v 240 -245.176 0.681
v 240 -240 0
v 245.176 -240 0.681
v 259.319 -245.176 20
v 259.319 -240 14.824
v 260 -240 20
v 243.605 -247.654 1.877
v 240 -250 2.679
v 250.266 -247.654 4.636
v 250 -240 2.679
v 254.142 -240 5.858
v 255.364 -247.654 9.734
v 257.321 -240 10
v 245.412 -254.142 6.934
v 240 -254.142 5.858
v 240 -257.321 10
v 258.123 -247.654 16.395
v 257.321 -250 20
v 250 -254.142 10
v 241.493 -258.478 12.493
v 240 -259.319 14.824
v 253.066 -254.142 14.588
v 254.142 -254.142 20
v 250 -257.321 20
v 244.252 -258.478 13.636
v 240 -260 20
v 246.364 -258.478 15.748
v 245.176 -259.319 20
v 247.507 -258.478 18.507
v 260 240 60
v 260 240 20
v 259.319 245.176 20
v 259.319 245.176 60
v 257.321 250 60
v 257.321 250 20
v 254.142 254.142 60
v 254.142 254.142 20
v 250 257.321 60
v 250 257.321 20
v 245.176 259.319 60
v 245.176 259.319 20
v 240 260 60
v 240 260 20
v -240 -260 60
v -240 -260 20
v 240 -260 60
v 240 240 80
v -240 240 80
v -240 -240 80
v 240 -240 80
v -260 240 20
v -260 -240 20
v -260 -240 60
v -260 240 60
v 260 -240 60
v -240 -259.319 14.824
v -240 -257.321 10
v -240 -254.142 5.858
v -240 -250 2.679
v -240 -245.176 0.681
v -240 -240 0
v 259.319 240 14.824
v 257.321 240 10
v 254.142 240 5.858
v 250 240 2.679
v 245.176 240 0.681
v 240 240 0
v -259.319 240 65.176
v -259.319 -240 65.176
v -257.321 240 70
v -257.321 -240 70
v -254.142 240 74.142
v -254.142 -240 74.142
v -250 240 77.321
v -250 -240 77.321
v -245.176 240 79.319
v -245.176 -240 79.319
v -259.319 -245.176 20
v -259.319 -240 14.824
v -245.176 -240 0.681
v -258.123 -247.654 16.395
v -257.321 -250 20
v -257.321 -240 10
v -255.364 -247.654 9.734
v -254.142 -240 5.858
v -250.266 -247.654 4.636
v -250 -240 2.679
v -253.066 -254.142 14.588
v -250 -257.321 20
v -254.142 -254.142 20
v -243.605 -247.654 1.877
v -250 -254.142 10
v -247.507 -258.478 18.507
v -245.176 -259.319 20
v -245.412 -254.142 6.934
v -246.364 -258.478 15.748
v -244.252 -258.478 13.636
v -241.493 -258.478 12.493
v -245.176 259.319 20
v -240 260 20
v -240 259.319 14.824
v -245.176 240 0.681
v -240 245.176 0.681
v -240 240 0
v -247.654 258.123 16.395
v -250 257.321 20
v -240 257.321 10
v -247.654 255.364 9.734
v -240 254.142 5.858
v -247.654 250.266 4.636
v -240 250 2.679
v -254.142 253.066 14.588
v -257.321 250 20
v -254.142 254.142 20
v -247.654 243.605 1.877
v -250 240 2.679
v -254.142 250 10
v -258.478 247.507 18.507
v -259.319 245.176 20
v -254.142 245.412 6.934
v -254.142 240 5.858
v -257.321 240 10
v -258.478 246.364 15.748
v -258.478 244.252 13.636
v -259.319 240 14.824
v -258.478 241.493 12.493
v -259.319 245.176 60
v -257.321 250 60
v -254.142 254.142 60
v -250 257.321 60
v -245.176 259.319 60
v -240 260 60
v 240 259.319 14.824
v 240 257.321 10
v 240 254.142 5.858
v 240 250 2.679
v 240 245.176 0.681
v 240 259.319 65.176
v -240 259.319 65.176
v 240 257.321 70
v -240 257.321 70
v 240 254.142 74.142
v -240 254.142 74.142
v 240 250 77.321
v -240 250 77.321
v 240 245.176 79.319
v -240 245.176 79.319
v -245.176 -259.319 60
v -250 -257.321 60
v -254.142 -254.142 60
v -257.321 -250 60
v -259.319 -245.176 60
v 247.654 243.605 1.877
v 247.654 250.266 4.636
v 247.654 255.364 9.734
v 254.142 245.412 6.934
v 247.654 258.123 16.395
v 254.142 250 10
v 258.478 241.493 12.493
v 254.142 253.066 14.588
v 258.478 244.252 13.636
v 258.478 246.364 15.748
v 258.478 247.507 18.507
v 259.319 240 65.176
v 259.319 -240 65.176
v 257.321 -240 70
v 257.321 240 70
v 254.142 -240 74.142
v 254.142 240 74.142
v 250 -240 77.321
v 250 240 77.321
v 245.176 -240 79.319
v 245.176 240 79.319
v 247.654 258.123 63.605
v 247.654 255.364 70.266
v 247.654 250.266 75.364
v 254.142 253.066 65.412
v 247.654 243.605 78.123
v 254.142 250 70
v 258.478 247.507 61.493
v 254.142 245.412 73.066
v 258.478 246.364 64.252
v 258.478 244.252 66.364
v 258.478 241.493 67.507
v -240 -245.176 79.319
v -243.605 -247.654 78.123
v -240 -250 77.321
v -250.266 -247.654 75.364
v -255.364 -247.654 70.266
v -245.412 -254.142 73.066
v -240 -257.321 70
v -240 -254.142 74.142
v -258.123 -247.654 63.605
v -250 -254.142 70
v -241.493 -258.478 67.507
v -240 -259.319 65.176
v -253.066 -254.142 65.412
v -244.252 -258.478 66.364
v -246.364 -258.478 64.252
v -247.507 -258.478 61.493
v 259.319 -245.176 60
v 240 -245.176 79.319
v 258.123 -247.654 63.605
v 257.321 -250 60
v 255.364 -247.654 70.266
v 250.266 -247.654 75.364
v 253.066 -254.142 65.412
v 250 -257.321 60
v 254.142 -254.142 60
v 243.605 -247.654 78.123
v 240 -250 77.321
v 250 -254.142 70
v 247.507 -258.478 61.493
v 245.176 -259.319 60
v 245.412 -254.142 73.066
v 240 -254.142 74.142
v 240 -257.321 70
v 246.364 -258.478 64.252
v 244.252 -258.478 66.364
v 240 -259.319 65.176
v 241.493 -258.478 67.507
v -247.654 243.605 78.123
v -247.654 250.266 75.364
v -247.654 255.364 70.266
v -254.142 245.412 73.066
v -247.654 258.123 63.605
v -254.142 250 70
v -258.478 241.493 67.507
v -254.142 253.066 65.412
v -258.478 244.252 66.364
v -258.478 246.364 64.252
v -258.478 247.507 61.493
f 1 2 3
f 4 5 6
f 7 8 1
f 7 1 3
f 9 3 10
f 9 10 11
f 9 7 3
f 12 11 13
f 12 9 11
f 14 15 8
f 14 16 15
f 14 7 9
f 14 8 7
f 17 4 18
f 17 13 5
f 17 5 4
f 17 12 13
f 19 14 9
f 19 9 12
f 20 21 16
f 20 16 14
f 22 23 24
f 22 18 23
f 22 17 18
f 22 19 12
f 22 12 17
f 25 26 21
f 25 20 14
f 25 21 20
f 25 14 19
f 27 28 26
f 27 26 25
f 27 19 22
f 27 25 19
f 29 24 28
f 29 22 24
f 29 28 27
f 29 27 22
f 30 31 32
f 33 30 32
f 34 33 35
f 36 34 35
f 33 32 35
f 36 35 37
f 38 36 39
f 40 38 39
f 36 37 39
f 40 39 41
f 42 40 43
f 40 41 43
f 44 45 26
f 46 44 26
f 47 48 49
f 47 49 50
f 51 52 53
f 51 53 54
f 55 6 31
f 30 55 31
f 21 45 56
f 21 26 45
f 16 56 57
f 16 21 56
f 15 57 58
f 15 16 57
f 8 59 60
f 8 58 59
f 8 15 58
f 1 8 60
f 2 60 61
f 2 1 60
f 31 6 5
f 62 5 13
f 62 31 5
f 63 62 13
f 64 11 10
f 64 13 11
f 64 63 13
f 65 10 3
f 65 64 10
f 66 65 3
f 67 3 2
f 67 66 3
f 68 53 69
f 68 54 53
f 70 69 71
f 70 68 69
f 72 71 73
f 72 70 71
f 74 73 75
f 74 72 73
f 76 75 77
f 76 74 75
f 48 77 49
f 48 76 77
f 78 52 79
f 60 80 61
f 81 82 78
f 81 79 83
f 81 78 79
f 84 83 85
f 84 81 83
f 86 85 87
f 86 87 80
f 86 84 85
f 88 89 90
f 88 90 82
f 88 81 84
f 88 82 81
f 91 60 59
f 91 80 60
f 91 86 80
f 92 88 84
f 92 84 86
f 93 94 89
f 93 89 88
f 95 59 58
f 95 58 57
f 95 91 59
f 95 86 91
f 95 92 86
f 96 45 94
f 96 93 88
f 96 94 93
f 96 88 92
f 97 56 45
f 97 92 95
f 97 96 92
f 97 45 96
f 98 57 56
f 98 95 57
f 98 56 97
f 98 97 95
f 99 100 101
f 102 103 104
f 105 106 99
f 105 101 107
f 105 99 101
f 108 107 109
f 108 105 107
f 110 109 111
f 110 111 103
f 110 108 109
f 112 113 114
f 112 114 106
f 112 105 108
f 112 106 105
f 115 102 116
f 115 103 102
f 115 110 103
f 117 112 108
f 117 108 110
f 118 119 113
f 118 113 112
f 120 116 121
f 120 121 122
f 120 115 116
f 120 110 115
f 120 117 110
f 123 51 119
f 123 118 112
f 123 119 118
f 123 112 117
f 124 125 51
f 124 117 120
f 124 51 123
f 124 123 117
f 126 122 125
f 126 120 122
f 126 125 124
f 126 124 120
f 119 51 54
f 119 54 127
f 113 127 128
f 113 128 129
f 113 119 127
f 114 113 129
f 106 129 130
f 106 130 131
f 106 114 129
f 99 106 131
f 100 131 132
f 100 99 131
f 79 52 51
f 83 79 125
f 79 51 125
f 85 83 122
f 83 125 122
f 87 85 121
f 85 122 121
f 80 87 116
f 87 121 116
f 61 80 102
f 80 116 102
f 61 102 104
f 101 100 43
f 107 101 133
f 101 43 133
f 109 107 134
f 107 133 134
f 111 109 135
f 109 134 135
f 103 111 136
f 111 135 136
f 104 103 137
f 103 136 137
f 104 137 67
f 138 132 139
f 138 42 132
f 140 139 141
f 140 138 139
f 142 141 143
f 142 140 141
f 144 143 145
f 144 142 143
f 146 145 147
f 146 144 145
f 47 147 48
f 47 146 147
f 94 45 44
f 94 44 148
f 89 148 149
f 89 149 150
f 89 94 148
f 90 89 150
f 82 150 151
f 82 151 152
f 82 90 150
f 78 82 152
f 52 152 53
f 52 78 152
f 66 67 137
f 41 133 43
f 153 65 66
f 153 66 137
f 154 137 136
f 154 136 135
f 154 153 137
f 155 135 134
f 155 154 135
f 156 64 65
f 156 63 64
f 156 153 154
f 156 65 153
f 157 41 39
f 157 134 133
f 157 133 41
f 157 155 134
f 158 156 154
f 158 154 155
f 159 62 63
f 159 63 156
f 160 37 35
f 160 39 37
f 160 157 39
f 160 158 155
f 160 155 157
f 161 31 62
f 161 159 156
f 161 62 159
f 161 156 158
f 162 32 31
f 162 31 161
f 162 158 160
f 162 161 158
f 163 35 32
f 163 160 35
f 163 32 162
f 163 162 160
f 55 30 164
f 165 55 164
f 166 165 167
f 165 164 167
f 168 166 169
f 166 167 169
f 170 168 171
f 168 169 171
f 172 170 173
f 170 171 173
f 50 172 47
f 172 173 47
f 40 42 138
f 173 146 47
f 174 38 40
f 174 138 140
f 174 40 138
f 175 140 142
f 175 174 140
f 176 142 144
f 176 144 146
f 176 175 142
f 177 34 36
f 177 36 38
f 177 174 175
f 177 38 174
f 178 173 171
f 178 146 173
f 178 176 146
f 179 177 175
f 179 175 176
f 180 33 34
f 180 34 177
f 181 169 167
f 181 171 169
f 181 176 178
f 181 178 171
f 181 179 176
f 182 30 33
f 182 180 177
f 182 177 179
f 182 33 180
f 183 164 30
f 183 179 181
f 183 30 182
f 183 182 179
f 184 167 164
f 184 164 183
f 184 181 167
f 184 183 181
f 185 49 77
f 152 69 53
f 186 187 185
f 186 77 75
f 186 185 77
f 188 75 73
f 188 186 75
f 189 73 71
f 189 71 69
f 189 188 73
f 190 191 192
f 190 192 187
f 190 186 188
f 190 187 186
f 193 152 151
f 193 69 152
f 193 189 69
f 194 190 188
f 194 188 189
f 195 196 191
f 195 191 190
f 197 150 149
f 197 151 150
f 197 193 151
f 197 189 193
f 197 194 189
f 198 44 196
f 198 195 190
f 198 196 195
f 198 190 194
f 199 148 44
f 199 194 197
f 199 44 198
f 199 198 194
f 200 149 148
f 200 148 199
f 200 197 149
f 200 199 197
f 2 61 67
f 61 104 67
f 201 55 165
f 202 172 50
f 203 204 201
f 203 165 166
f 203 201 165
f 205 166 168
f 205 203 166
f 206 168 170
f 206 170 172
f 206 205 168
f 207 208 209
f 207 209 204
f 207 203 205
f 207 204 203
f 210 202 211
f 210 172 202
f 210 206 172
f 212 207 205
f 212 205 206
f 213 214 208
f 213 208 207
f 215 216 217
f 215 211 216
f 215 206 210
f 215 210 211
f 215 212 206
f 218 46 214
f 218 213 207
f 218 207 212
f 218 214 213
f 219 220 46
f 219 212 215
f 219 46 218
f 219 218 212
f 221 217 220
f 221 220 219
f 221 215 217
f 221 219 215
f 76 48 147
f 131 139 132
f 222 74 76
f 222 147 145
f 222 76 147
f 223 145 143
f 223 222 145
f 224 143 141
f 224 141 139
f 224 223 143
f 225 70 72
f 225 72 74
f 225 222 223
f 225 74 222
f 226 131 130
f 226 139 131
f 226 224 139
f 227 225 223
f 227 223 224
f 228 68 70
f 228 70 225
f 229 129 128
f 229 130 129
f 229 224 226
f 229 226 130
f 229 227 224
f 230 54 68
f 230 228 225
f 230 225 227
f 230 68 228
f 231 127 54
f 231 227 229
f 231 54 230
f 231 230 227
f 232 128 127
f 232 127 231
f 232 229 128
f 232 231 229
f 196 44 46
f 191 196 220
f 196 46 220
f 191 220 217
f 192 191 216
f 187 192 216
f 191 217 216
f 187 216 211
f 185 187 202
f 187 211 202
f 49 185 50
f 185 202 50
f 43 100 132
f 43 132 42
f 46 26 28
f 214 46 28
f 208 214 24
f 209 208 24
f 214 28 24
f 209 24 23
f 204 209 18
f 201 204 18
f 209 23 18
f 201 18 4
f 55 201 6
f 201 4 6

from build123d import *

# Parameters (mm, degrees)
F0_W         = 520
F0_H         = 520
F1_DEPTH     = 80
F2_R         = 20
F3_T1_DEPTH  = 40
F3_S5_W      = 20
F3_S5_H      = 20
F3_T6_DEPTH  = 20
F3_S11_W     = 20
F3_S11_H     = 20
F3_T12_DEPTH = 20
F3_S17_W     = 20
F3_S17_H     = 20
F3_T18_DEPTH = 20
F3_S23_W     = 20
F3_S23_H     = 20
F3_T24_DEPTH = 20
F3_S29_W     = 20
F3_S29_H     = 20
F3_T30_DEPTH = 20
F3_S35_W     = 20
F3_S35_H     = 20
F3_T36_DEPTH = 20
F3_S41_W     = 20
F3_S41_H     = 20
F3_T42_DEPTH = 20
F3_S47_W     = 20
F3_S47_H     = 20
F3_T48_DEPTH = 20


# Not quite as in the source:
# - a fillet or chamfer that OpenCascade refuses, or shapes differently, is made with other operations: its cross-section is extruded or revolved along the edge and cut away or added


with BuildPart() as f1:
    # F0 (on Top) → F1 (new body)
    with BuildSketch(Plane.XY):
        Rectangle(F0_W, F0_H)
    extrude(amount=F1_DEPTH)

    # F2
    f2_edges = [f1.edges().sort_by_distance(p)[0] for p in [
        (260, 0, 80),
        (0, 260, 80),
        (-260, 0, 80),
        (0, -260, 80),
        (0, -260, 0),
        (260, 0, 0),
        (0, 260, 0),
        (-260, 0, 0),
    ]]
    fillet(f2_edges, radius=F2_R)

    # F3: fillet of radius 20 on 4 edges, made by hand

    # F3_s2 → F3_t1 (cut)
    with BuildSketch(Plane.XY.offset(20)):
        with BuildLine():
            ThreePointArc((240, -260), (254.1421356237, -254.1421356237), (260, -240))
            Line((260, -240), (260, -260))
            Line((260, -260), (240, -260))
        make_face()
        with BuildLine():
            ThreePointArc((260, 240), (254.1421356237, 254.1421356237), (240, 260))
            Line((240, 260), (260, 260))
            Line((260, 260), (260, 240))
        make_face()
        with BuildLine():
            ThreePointArc((-260, 240), (-254.1421356237, 254.1421356237), (-240, 260))
            Line((-240, 260), (-260, 260))
            Line((-260, 260), (-260, 240))
        make_face()
        with BuildLine():
            ThreePointArc((-240, -260), (-254.1421356237, -254.1421356237), (-260, -240))
            Line((-260, -240), (-260, -260))
            Line((-260, -260), (-240, -260))
        make_face()
    extrude(amount=F3_T1_DEPTH, mode=Mode.SUBTRACT)


with BuildPart() as f3_tool4:
    # F3_s5 → F3_t6 (new body)
    with BuildSketch(Plane.XZ.offset(240)):
        with Locations((-250, 10)):
            Rectangle(F3_S5_W, F3_S5_H)
    extrude(amount=F3_T6_DEPTH)

    # F3_s7 → F3_t8 (revolve, cut)
    with BuildSketch(Plane(origin=(-240, -240, 20), x_dir=(0.7071067812, 0, 0.7071067812), z_dir=(0.7071067812, 0, -0.7071067812))):
        with BuildLine():
            ThreePointArc((0, -20), (20, 0), (0, 20))
            Line((0, 20), (0, -20))
        make_face()
    revolve(axis=Axis((-240, -240, 20), (0, -1, 0)), mode=Mode.SUBTRACT)


with BuildPart() as f1_1:
    add(f1.part)

    # F3_t3: cut F3_tool4
    add(f3_tool4.part, mode=Mode.SUBTRACT)


with BuildPart() as f3_tool10:
    # F3_s11 → F3_t12 (new body)
    with BuildSketch(Plane.XZ.offset(240)):
        with Locations((-250, 70)):
            Rectangle(F3_S11_W, F3_S11_H)
    extrude(amount=F3_T12_DEPTH)

    # F3_s13 → F3_t14 (revolve, cut)
    with BuildSketch(Plane(origin=(-240, -240, 60), x_dir=(0.7071067812, 0, -0.7071067812), z_dir=(-0.7071067812, 0, -0.7071067812))):
        with BuildLine():
            ThreePointArc((0, -20), (20, 0), (0, 20))
            Line((0, 20), (0, -20))
        make_face()
    revolve(axis=Axis((-240, -240, 60), (0, -1, 0)), mode=Mode.SUBTRACT)


with BuildPart() as f1_2:
    add(f1_1.part)

    # F3_t9: cut F3_tool10
    add(f3_tool10.part, mode=Mode.SUBTRACT)


with BuildPart() as f3_tool16:
    # F3_s17 → F3_t18 (new body)
    with BuildSketch(Plane.YZ.offset(-240)):
        with Locations((250, 10)):
            Rectangle(F3_S17_W, F3_S17_H)
    extrude(amount=-F3_T18_DEPTH)

    # F3_s19 → F3_t20 (revolve, cut)
    with BuildSketch(Plane(origin=(-240, 240, 20), x_dir=(0, -0.7071067812, 0.7071067812), z_dir=(0, -0.7071067812, -0.7071067812))):
        with BuildLine():
            ThreePointArc((0, -20), (20, 0), (0, 20))
            Line((0, 20), (0, -20))
        make_face()
    revolve(axis=Axis((-240, 240, 20), (-1, 0, 0)), mode=Mode.SUBTRACT)


with BuildPart() as f1_3:
    add(f1_2.part)

    # F3_t15: cut F3_tool16
    add(f3_tool16.part, mode=Mode.SUBTRACT)


with BuildPart() as f3_tool22:
    # F3_s23 → F3_t24 (new body)
    with BuildSketch(Plane.YZ.offset(-240)):
        with Locations((250, 70)):
            Rectangle(F3_S23_W, F3_S23_H)
    extrude(amount=-F3_T24_DEPTH)

    # F3_s25 → F3_t26 (revolve, cut)
    with BuildSketch(Plane(origin=(-240, 240, 60), x_dir=(0, -0.7071067812, -0.7071067812), z_dir=(0, 0.7071067812, -0.7071067812))):
        with BuildLine():
            ThreePointArc((0, -20), (20, 0), (0, 20))
            Line((0, 20), (0, -20))
        make_face()
    revolve(axis=Axis((-240, 240, 60), (-1, 0, 0)), mode=Mode.SUBTRACT)


with BuildPart() as f1_4:
    add(f1_3.part)

    # F3_t21: cut F3_tool22
    add(f3_tool22.part, mode=Mode.SUBTRACT)


with BuildPart() as f3_tool28:
    # F3_s29 → F3_t30 (new body)
    with BuildSketch(Plane.YZ.offset(240)):
        with Locations((250, 10)):
            Rectangle(F3_S29_W, F3_S29_H)
    extrude(amount=F3_T30_DEPTH)

    # F3_s31 → F3_t32 (revolve, cut)
    with BuildSketch(Plane(origin=(240, 240, 20), x_dir=(0, -0.7071067812, 0.7071067812), z_dir=(0, 0.7071067812, 0.7071067812))):
        with BuildLine():
            ThreePointArc((0, -20), (20, 0), (0, 20))
            Line((0, 20), (0, -20))
        make_face()
    revolve(axis=Axis((240, 240, 20), (1, 0, 0)), mode=Mode.SUBTRACT)


with BuildPart() as f1_5:
    add(f1_4.part)

    # F3_t27: cut F3_tool28
    add(f3_tool28.part, mode=Mode.SUBTRACT)


with BuildPart() as f3_tool34:
    # F3_s35 → F3_t36 (new body)
    with BuildSketch(Plane.YZ.offset(240)):
        with Locations((250, 70)):
            Rectangle(F3_S35_W, F3_S35_H)
    extrude(amount=F3_T36_DEPTH)

    # F3_s37 → F3_t38 (revolve, cut)
    with BuildSketch(Plane(origin=(240, 240, 60), x_dir=(0, -0.7071067812, -0.7071067812), z_dir=(0, -0.7071067812, 0.7071067812))):
        with BuildLine():
            ThreePointArc((0, -20), (20, 0), (0, 20))
            Line((0, 20), (0, -20))
        make_face()
    revolve(axis=Axis((240, 240, 60), (1, 0, 0)), mode=Mode.SUBTRACT)


with BuildPart() as f1_6:
    add(f1_5.part)

    # F3_t33: cut F3_tool34
    add(f3_tool34.part, mode=Mode.SUBTRACT)


with BuildPart() as f3_tool40:
    # F3_s41 → F3_t42 (new body)
    with BuildSketch(Plane.XZ.offset(240)):
        with Locations((250, 10)):
            Rectangle(F3_S41_W, F3_S41_H)
    extrude(amount=F3_T42_DEPTH)

    # F3_s43 → F3_t44 (revolve, cut)
    with BuildSketch(Plane(origin=(240, -240, 20), x_dir=(-0.7071067812, 0, 0.7071067812), z_dir=(0.7071067812, 0, 0.7071067812))):
        with BuildLine():
            ThreePointArc((0, -20), (20, 0), (0, 20))
            Line((0, 20), (0, -20))
        make_face()
    revolve(axis=Axis((240, -240, 20), (0, -1, 0)), mode=Mode.SUBTRACT)


with BuildPart() as f1_7:
    add(f1_6.part)

    # F3_t39: cut F3_tool40
    add(f3_tool40.part, mode=Mode.SUBTRACT)


with BuildPart() as f3_tool46:
    # F3_s47 → F3_t48 (new body)
    with BuildSketch(Plane.XZ.offset(240)):
        with Locations((250, 70)):
            Rectangle(F3_S47_W, F3_S47_H)
    extrude(amount=F3_T48_DEPTH)

    # F3_s49 → F3_t50 (revolve, cut)
    with BuildSketch(Plane(origin=(240, -240, 60), x_dir=(-0.7071067812, 0, -0.7071067812), z_dir=(-0.7071067812, 0, 0.7071067812))):
        with BuildLine():
            ThreePointArc((0, -20), (20, 0), (0, 20))
            Line((0, 20), (0, -20))
        make_face()
    revolve(axis=Axis((240, -240, 60), (0, -1, 0)), mode=Mode.SUBTRACT)


with BuildPart() as f1_8:
    add(f1_7.part)

    # F3_t45: cut F3_tool46
    add(f3_tool46.part, mode=Mode.SUBTRACT)


solid = f1_8.part
